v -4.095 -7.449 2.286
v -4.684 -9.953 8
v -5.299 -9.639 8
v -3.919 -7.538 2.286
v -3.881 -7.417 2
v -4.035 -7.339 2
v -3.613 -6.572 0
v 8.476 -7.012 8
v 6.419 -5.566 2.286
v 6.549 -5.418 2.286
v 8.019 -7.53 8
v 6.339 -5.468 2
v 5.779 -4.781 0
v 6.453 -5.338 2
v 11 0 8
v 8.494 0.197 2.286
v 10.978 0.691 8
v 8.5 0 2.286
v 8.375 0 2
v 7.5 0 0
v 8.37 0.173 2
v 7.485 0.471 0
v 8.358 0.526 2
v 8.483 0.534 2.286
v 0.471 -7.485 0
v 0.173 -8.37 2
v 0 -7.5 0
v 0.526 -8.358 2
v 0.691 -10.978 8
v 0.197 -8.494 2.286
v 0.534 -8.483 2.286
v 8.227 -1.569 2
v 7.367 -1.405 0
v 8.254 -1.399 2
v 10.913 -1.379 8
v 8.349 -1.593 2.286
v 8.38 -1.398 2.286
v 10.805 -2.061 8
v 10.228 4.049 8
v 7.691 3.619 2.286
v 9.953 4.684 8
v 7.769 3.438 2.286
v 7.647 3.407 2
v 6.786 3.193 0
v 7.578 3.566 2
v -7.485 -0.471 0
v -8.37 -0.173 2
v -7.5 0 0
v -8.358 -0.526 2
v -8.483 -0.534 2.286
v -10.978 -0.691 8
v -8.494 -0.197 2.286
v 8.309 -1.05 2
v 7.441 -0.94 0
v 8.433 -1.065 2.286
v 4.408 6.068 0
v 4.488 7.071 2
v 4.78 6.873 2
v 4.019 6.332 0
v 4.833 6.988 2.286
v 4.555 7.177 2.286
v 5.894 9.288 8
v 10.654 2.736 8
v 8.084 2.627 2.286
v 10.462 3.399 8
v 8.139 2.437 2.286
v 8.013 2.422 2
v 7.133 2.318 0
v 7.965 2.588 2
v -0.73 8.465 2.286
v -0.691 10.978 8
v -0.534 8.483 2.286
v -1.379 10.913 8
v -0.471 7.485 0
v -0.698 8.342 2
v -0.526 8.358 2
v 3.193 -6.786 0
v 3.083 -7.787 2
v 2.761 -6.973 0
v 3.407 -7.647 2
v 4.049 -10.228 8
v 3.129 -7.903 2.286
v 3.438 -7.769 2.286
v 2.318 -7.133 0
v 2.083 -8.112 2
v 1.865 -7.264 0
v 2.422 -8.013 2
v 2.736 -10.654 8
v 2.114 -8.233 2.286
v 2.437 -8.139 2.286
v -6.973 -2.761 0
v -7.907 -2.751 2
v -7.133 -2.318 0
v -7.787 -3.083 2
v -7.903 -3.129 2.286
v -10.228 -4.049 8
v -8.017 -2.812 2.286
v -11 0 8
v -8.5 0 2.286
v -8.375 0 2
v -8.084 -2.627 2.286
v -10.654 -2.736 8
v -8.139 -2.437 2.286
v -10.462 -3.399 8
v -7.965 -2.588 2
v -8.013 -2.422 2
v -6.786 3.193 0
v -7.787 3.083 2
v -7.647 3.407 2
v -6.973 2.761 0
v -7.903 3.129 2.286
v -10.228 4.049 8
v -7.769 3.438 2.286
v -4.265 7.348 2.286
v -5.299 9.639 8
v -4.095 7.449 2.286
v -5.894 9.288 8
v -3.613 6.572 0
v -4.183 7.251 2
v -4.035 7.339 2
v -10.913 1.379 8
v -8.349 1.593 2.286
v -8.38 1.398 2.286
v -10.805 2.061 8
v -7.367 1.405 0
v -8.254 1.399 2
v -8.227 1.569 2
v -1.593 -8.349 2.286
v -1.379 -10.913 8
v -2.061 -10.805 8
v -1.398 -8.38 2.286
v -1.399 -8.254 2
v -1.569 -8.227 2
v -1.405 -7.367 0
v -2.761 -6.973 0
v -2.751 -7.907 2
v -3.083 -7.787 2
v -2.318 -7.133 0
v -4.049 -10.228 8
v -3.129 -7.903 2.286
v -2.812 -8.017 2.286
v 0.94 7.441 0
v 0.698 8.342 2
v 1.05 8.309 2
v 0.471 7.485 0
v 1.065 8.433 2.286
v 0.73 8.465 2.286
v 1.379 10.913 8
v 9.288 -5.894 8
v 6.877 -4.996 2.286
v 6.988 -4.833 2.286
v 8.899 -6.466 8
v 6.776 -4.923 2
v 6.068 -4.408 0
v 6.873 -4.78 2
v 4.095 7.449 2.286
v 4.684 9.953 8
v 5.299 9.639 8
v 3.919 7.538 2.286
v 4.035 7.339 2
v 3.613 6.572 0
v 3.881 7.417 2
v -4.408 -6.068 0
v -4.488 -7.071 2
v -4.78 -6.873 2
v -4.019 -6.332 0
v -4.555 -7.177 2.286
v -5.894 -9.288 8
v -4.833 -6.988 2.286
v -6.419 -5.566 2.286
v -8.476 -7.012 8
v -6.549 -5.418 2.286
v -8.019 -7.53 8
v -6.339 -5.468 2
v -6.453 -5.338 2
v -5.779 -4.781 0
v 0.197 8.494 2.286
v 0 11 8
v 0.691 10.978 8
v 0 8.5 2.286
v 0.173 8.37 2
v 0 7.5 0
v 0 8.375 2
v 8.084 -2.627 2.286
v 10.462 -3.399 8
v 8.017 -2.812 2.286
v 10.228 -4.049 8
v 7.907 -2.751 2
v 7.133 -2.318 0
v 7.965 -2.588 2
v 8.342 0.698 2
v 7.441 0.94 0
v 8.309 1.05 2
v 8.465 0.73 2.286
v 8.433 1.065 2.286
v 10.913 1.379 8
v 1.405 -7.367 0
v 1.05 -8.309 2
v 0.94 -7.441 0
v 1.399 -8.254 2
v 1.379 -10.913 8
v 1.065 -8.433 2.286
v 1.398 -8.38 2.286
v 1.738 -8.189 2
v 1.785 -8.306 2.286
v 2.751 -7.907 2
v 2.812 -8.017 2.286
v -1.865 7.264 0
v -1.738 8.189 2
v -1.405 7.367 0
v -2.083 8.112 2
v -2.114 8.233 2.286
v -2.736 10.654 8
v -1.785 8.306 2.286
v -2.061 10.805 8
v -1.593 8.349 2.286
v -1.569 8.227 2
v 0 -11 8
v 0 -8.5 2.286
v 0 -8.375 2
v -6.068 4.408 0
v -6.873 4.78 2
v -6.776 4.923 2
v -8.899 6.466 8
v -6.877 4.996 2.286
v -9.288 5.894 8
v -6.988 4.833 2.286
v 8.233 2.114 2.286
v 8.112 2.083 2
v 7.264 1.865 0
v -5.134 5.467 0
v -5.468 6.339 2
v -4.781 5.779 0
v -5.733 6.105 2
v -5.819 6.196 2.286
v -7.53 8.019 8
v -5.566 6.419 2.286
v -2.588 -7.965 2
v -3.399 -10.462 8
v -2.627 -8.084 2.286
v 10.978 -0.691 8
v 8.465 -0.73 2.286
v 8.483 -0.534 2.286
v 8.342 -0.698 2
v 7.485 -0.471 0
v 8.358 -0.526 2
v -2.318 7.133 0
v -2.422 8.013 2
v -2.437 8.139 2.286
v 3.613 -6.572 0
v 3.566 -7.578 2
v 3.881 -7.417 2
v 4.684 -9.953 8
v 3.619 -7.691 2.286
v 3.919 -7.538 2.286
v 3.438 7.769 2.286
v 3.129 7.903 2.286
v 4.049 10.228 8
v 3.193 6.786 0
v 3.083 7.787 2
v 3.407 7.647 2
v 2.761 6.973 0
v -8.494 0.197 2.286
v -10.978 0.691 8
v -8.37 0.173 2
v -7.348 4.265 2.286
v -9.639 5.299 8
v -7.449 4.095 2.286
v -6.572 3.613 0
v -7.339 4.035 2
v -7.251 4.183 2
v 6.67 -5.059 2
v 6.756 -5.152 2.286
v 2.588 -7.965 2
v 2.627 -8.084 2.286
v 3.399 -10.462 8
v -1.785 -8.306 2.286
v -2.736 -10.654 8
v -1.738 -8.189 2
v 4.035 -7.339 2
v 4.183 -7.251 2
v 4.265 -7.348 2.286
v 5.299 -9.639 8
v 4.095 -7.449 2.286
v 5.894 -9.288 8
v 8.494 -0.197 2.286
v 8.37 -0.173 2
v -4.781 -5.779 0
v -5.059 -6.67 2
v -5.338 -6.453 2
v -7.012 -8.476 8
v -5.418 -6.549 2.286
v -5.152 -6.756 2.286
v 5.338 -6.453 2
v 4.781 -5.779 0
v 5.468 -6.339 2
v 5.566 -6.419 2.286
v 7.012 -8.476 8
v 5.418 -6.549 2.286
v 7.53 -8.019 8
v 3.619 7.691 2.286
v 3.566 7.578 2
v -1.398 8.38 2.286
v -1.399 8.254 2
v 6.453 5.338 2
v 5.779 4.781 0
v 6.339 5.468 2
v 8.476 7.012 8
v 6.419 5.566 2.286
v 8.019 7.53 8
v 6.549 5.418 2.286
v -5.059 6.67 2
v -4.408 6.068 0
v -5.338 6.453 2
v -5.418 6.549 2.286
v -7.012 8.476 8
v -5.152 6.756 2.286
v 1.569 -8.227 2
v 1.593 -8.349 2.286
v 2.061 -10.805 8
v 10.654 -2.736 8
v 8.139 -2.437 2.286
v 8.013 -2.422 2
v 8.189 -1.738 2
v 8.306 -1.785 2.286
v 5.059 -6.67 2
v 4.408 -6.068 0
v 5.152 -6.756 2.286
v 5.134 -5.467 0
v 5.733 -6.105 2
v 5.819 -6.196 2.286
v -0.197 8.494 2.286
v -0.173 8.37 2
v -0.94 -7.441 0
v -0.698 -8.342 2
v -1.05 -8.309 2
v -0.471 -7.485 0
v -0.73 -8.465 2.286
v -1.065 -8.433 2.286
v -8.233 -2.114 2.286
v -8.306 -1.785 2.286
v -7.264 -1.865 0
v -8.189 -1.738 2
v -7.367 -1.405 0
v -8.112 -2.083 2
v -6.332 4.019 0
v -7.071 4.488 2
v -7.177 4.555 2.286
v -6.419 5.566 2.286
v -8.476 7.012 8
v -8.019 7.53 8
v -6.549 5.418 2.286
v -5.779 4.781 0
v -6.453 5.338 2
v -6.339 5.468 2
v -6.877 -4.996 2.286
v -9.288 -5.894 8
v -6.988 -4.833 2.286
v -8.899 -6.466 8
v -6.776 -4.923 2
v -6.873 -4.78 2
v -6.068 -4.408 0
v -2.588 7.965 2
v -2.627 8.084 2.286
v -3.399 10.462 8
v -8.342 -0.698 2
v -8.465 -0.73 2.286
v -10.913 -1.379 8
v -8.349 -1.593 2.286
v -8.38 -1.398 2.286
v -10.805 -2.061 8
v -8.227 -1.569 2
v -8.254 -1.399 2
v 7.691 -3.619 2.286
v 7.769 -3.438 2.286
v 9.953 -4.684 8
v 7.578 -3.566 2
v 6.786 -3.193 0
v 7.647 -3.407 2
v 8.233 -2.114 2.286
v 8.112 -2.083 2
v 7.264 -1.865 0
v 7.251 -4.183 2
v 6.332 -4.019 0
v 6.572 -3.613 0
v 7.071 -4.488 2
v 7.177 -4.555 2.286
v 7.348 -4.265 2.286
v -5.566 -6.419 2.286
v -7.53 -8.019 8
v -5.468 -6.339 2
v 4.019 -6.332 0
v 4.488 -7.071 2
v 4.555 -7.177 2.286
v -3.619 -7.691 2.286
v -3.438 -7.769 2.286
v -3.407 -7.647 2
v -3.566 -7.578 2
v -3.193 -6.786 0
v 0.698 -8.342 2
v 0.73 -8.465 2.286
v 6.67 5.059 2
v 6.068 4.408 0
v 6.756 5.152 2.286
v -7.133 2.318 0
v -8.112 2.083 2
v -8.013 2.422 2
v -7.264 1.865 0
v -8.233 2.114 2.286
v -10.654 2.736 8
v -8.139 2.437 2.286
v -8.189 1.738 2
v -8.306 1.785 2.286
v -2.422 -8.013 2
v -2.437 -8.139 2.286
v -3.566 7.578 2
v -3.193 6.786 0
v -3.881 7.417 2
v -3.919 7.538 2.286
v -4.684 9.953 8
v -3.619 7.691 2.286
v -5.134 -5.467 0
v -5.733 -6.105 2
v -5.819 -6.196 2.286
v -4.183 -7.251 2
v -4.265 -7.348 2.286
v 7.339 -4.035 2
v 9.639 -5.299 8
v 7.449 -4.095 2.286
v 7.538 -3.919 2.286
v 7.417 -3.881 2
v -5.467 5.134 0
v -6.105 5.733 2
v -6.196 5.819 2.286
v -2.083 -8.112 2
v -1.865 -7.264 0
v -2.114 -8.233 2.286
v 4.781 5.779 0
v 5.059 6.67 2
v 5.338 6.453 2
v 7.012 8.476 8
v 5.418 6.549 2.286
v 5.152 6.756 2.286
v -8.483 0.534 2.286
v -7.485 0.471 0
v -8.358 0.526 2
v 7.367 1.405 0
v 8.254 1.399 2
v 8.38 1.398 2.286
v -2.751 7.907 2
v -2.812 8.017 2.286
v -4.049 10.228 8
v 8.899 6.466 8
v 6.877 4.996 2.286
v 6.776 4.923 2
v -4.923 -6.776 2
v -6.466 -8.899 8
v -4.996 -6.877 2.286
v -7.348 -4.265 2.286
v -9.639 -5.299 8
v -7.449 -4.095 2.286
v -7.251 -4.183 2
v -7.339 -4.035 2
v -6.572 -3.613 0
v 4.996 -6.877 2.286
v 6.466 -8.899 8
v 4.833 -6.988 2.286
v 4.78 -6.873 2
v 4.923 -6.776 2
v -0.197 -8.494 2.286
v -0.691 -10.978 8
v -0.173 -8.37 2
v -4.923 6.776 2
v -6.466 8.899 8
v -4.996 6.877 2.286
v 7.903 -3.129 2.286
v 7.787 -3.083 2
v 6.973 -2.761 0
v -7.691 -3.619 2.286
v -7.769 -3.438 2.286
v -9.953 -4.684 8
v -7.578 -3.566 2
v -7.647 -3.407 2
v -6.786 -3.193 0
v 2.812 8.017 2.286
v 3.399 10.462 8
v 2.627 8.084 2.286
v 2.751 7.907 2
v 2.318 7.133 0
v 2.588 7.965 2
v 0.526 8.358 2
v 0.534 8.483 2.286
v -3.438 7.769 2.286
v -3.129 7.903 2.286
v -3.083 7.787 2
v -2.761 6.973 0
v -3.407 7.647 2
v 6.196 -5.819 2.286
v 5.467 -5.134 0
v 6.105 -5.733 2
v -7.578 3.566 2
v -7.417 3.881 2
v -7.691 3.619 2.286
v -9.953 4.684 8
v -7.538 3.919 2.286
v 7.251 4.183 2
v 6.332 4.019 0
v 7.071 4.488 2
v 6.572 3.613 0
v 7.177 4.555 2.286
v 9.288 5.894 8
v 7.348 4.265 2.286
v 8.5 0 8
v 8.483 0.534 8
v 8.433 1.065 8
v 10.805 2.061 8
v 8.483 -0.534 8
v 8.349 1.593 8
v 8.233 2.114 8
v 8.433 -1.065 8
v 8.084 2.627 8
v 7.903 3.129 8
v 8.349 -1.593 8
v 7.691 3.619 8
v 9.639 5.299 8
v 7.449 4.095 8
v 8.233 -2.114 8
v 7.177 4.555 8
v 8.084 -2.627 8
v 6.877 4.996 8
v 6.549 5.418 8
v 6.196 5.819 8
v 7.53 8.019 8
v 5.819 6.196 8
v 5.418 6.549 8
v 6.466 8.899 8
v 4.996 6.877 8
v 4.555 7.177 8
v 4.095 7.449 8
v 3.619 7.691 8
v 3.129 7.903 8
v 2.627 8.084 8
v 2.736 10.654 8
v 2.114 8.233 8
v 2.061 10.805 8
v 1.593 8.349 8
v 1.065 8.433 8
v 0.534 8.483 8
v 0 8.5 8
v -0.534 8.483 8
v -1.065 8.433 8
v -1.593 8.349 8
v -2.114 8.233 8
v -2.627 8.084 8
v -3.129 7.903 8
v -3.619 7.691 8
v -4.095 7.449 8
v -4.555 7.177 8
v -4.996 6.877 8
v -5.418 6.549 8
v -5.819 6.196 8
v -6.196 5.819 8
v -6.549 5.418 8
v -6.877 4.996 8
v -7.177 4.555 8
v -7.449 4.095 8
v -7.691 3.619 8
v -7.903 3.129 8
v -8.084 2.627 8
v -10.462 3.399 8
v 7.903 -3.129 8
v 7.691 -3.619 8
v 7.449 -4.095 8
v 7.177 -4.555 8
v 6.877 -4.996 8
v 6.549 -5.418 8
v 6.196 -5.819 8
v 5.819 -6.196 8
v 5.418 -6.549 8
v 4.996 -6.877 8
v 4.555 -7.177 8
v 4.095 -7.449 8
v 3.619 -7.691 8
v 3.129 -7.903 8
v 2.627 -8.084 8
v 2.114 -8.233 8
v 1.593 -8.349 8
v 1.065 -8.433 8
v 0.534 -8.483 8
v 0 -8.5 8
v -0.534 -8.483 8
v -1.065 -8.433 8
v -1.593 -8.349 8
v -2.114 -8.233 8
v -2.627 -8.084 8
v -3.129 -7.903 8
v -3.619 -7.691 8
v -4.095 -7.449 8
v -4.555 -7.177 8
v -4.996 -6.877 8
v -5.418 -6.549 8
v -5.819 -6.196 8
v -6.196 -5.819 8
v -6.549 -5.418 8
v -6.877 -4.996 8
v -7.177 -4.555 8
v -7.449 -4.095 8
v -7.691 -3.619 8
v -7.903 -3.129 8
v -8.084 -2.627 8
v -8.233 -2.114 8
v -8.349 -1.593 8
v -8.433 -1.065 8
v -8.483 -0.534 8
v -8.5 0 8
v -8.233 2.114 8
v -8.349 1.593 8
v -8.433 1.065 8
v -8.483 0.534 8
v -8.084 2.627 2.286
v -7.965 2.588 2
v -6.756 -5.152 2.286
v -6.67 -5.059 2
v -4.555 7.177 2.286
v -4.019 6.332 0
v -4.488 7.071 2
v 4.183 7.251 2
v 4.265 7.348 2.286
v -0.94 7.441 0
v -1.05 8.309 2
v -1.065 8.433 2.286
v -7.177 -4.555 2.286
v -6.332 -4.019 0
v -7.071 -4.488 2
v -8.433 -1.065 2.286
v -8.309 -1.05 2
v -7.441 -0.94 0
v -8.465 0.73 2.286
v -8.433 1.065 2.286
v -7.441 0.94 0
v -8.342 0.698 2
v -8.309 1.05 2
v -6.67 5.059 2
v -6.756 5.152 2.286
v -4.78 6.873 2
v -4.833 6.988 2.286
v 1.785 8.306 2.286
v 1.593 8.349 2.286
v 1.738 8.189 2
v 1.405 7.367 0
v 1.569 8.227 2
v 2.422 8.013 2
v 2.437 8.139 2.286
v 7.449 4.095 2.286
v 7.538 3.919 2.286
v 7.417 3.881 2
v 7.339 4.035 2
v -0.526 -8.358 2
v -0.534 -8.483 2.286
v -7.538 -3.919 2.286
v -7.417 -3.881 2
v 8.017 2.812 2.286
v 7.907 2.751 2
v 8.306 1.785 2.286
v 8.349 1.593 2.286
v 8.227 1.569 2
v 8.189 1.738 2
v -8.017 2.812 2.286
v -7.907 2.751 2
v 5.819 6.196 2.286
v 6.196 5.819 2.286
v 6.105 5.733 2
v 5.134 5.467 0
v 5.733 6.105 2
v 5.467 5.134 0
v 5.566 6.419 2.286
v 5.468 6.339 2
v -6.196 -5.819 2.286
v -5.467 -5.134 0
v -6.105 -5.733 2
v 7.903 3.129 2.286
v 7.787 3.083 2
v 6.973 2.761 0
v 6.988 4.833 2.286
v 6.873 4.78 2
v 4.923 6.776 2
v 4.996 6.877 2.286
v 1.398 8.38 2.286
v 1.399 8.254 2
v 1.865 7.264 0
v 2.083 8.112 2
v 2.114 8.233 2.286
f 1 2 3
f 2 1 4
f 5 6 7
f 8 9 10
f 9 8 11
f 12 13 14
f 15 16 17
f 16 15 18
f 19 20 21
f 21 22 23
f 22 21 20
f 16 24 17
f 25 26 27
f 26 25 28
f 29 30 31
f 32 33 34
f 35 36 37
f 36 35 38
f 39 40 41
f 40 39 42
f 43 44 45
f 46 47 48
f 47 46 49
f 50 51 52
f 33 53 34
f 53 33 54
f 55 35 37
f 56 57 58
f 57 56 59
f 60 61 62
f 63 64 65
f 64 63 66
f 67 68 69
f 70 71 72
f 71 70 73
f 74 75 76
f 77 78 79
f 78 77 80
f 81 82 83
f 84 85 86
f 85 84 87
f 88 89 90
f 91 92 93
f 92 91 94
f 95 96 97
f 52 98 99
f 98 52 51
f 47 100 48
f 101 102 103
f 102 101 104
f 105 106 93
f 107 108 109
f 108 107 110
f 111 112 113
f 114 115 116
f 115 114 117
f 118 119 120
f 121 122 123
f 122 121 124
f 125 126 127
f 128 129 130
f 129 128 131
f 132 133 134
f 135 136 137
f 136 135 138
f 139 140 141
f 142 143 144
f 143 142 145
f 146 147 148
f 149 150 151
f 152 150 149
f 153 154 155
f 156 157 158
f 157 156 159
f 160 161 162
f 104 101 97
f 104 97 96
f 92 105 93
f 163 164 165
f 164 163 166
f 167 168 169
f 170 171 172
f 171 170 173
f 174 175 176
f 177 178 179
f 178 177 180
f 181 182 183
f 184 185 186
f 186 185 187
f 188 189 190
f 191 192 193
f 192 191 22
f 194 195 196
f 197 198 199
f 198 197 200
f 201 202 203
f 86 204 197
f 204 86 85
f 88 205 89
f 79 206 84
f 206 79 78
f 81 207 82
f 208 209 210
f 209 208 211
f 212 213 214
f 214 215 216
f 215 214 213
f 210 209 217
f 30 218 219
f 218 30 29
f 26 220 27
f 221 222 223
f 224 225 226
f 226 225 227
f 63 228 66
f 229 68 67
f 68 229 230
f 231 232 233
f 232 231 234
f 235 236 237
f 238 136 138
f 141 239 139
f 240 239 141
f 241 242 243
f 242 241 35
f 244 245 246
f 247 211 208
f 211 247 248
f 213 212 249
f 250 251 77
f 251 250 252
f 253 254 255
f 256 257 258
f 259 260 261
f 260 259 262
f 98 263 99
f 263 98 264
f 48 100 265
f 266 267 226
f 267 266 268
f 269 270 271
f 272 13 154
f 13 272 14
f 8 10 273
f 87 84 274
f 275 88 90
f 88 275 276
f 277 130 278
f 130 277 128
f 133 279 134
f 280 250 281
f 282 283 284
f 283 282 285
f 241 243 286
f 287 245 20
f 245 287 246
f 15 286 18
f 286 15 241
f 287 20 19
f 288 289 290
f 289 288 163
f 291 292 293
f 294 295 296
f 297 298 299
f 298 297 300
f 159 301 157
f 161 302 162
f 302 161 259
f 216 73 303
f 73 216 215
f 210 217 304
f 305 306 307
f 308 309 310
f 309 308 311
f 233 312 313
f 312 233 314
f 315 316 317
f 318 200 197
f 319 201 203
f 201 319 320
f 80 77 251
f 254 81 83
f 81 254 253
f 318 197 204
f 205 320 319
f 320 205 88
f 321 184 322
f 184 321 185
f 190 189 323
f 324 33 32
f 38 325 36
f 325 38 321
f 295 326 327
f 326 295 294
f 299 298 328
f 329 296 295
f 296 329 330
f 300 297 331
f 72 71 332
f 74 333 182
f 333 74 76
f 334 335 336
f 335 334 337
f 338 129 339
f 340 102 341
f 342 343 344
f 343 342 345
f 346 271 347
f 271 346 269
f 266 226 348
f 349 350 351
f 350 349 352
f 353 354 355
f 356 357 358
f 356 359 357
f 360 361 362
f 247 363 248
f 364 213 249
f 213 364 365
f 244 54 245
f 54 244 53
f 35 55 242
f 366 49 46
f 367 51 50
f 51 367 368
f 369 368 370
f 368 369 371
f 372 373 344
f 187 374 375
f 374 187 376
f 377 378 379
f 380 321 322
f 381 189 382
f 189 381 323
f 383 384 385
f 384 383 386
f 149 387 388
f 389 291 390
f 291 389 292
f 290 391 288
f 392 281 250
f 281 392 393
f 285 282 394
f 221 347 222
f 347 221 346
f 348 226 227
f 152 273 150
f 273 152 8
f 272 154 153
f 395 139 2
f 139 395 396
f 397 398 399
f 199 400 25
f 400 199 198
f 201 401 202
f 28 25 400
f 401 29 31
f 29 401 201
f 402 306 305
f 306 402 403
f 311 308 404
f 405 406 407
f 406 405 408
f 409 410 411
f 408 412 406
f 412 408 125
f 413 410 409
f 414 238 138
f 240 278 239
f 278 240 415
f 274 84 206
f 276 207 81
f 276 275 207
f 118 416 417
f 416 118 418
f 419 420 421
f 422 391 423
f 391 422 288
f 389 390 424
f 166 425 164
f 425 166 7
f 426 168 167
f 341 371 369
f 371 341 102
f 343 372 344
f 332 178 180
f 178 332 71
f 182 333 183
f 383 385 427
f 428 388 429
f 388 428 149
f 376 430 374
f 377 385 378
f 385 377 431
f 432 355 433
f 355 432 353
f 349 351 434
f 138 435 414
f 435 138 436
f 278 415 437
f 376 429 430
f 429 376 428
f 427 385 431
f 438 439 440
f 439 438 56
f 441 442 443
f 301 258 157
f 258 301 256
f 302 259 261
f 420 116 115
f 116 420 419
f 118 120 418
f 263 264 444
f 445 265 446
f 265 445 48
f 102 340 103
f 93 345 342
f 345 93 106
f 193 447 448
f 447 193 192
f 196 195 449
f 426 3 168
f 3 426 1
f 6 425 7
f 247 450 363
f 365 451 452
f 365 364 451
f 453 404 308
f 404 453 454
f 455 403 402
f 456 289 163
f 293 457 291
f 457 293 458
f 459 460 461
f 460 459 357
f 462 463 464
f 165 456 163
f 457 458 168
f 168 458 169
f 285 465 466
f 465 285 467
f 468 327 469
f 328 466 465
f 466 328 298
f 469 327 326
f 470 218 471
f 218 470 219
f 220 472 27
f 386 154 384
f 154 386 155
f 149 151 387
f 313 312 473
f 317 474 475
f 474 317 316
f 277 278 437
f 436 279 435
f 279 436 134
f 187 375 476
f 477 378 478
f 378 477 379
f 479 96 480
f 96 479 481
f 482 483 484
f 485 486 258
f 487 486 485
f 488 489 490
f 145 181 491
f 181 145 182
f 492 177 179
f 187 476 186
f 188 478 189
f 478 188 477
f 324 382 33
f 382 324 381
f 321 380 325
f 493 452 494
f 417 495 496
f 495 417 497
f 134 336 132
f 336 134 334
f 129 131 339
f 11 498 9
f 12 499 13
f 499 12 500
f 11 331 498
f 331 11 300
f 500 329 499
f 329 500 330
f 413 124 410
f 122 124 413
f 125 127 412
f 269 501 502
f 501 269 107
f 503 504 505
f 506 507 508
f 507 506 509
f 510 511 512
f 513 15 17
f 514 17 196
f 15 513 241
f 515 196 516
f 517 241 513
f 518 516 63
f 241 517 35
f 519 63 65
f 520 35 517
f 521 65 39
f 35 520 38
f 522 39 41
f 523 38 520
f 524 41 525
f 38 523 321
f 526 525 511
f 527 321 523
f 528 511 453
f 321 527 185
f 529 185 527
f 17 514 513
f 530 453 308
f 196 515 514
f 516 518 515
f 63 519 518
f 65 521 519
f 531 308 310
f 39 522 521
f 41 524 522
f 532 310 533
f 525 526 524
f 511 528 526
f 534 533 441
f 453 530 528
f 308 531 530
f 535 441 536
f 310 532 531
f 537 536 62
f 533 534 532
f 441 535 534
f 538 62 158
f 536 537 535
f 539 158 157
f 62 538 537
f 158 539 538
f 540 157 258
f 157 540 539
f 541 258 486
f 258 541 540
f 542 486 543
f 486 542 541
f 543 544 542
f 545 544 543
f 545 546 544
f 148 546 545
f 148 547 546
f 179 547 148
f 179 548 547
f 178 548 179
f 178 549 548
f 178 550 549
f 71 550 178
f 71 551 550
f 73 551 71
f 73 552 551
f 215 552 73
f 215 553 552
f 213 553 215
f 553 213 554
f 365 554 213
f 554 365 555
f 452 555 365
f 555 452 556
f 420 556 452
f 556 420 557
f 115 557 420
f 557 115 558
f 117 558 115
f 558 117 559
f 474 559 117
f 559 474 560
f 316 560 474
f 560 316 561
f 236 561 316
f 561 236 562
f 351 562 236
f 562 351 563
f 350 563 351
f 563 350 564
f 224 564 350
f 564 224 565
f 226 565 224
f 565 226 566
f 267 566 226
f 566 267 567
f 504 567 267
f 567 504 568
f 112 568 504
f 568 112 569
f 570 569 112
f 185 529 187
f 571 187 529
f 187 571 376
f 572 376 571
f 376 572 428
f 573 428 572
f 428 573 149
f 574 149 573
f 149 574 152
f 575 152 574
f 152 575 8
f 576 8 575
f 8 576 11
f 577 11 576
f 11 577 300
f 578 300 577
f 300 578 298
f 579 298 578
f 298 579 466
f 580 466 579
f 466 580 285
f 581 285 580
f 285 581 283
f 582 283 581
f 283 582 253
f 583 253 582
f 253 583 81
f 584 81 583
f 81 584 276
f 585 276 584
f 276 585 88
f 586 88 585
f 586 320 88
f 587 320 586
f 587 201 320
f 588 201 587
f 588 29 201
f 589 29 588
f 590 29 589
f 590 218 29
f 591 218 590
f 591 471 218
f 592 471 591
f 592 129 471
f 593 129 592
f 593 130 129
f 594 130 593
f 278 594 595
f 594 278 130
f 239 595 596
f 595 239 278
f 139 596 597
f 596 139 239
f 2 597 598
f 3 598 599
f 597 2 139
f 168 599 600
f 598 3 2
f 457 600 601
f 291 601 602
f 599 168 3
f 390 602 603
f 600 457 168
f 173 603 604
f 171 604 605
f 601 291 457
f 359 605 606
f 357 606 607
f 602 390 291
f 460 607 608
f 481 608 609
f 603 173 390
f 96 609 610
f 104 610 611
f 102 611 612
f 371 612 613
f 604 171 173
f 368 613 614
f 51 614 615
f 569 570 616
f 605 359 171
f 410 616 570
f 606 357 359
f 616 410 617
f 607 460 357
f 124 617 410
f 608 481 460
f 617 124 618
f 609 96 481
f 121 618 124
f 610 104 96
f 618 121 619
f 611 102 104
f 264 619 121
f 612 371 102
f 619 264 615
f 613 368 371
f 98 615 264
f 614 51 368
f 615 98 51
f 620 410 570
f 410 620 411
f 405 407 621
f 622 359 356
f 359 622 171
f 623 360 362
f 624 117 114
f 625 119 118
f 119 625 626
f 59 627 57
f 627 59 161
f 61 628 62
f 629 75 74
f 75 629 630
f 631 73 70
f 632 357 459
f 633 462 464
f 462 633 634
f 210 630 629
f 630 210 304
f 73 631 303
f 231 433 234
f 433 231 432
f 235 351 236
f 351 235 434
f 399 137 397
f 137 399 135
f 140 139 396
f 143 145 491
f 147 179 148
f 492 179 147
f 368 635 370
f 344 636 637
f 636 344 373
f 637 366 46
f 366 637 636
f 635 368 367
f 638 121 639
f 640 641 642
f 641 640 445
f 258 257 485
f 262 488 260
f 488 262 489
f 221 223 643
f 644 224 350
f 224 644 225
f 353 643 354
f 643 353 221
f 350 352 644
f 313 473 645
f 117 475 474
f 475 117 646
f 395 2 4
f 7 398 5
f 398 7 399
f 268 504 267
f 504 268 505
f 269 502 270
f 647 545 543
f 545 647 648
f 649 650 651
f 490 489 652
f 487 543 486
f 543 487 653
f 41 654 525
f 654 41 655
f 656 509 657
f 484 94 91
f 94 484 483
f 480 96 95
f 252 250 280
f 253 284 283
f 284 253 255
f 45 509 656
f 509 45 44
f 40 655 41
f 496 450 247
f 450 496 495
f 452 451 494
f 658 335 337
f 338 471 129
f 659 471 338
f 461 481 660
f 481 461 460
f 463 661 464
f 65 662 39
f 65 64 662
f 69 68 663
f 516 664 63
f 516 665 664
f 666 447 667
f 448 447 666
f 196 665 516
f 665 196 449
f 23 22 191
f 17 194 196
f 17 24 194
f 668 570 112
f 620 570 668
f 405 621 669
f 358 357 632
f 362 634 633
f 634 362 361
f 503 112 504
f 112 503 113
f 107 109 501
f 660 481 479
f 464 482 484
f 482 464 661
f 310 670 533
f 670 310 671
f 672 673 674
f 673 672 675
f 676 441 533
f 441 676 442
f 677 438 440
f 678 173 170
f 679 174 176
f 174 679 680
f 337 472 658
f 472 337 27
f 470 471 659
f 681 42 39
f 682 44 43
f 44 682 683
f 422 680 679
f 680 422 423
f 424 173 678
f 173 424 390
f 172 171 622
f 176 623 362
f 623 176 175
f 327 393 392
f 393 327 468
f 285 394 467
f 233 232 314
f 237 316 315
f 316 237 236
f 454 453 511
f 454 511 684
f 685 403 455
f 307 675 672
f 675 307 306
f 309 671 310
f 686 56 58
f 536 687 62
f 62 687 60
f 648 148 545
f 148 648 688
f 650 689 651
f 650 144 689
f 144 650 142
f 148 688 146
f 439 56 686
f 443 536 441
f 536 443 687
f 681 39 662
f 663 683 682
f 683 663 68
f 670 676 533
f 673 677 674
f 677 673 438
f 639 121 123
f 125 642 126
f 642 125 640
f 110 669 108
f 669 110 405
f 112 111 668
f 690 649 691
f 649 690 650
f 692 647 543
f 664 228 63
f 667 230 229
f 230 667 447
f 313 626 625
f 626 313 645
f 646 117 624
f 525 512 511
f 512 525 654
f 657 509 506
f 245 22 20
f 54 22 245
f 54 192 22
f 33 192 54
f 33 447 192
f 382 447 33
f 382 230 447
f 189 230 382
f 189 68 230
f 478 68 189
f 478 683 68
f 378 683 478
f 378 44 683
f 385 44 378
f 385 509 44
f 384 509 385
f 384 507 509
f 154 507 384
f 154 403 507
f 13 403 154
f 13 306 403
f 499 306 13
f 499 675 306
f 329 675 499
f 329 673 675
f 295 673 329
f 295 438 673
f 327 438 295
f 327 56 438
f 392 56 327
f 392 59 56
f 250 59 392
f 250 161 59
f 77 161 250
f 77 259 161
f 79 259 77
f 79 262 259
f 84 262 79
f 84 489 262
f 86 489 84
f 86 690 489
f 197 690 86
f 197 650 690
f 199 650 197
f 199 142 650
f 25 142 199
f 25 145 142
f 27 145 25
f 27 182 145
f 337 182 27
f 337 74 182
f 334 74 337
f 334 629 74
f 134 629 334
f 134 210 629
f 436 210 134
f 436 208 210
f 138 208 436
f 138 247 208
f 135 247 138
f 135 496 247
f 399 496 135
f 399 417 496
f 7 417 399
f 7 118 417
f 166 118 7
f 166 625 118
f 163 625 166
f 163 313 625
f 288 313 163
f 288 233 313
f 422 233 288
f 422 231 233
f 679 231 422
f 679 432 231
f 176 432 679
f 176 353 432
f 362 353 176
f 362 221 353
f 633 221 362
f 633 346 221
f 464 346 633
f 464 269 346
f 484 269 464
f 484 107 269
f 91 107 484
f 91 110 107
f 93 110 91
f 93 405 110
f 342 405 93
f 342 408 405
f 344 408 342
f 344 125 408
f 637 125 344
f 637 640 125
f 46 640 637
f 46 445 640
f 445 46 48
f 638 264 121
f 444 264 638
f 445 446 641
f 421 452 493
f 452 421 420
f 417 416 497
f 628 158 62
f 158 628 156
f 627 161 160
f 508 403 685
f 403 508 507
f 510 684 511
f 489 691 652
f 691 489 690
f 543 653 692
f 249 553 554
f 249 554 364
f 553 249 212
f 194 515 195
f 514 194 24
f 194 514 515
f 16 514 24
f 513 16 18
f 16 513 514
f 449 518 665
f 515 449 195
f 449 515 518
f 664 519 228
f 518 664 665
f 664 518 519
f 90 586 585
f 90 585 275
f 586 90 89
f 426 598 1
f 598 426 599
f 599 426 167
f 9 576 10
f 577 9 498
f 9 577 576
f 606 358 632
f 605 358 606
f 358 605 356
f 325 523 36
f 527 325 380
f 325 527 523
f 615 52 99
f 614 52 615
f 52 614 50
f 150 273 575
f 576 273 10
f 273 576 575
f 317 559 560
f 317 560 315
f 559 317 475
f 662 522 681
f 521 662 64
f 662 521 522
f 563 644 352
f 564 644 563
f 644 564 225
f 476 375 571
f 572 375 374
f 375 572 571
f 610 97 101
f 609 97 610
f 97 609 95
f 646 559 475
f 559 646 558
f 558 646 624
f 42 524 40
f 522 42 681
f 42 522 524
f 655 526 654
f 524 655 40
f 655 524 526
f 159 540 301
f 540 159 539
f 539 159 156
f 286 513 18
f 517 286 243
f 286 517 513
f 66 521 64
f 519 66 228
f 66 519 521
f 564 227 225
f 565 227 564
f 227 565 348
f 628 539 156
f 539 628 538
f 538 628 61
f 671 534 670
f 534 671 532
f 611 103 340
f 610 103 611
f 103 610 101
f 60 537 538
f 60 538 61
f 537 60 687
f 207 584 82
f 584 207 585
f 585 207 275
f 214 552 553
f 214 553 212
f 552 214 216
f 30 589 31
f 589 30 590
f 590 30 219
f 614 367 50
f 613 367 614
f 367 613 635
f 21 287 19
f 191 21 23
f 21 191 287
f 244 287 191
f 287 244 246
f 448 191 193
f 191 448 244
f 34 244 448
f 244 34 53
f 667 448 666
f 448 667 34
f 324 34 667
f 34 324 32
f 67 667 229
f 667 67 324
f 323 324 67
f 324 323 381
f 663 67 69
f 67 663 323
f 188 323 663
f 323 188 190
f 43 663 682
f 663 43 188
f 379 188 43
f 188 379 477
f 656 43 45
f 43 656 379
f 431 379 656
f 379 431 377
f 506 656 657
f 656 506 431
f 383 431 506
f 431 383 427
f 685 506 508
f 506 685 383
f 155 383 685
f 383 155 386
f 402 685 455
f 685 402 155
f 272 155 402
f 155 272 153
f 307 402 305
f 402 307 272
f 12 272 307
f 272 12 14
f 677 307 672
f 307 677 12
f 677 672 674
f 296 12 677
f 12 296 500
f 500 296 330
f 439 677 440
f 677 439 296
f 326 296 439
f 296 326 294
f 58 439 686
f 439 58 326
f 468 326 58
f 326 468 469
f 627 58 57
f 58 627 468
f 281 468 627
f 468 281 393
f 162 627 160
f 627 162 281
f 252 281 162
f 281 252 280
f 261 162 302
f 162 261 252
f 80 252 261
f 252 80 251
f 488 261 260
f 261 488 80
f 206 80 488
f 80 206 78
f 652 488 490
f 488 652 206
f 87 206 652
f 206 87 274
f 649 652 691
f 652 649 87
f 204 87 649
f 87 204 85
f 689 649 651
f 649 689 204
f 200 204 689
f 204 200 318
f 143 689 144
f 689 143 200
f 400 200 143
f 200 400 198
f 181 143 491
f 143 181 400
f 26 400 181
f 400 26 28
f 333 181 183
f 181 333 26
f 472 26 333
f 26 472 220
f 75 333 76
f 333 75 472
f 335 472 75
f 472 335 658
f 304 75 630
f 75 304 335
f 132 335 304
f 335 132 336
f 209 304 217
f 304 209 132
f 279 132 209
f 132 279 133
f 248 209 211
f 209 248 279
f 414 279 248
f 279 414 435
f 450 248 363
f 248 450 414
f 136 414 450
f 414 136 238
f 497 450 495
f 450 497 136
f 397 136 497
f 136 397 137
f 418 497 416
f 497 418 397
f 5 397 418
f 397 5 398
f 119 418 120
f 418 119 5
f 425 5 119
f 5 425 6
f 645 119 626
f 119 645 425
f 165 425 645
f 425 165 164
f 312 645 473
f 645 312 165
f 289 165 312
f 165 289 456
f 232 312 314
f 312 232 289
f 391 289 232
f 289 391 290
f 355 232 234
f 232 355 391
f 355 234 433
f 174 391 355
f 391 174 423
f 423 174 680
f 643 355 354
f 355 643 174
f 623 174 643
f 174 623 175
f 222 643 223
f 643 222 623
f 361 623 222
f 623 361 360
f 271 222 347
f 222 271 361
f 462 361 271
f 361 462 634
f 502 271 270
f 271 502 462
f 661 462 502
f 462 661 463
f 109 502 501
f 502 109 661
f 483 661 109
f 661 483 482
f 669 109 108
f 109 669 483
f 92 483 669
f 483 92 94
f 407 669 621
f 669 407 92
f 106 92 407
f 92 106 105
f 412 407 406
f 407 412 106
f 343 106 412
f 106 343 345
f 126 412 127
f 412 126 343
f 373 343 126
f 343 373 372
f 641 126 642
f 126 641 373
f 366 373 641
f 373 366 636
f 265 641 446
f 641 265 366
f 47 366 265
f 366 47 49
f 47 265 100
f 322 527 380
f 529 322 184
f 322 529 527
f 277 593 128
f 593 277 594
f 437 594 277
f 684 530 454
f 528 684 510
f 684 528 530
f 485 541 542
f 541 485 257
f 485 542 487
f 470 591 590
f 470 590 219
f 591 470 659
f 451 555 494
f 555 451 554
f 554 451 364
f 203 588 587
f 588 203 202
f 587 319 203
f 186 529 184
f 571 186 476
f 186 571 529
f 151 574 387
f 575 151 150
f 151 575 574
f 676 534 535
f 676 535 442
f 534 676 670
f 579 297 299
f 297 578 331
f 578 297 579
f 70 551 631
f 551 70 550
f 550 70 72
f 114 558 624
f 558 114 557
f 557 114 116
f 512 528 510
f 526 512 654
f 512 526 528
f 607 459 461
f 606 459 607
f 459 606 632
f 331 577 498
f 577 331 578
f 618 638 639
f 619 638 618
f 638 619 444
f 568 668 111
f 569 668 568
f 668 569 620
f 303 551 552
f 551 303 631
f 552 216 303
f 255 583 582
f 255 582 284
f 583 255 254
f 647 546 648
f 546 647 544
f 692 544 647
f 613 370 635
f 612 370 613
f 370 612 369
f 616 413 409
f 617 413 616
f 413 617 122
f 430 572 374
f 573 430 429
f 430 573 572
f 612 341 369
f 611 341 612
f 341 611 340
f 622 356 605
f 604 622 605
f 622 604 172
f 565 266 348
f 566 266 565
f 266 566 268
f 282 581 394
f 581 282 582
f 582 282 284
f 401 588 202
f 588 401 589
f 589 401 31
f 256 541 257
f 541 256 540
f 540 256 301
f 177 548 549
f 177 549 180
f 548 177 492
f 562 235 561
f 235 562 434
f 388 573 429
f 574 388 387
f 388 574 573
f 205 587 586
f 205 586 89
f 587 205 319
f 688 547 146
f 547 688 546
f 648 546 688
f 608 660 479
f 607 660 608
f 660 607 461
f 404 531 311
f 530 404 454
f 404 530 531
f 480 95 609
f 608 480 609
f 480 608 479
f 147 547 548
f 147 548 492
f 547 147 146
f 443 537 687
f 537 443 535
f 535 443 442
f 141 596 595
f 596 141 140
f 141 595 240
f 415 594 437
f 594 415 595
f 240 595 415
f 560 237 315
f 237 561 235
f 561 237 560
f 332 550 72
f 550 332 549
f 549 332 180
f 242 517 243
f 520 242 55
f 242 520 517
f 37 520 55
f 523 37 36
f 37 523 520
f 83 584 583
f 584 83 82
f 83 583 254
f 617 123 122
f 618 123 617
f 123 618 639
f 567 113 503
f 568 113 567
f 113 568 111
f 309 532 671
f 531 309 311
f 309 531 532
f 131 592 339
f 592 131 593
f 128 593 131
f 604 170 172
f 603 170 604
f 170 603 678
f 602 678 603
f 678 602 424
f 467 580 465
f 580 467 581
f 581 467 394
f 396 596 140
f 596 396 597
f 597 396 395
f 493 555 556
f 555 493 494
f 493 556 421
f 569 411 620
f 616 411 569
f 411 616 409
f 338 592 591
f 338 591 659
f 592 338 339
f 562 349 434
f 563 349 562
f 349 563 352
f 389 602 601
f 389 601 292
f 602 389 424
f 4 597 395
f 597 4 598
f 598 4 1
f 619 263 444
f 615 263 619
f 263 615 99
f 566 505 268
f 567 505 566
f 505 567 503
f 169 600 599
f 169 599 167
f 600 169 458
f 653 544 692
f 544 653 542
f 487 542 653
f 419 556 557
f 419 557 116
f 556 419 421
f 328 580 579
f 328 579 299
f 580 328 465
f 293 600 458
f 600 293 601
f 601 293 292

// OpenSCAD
//--------------------------------------------------------------
// Name: Подставка для цилиндрического повербанка. PwbStand.
// Version: 1.7
// Purpose: Замок.
// Author: Evgeny Klepikov
// E-mail: klek07@ya.ru
//
// Created: 25.09.2017
// Updated: 26.09.2017
// Copyright: (c) 2017 WildFox24
// Licence: GPL v3
//--------------------------------------------------------------

difference() {
    translate([0,0,0]) cylinder(h=8, d1=15, d2=22, $fn=100);
    translate([0,0,2]) cylinder(h=8, d=17, $fn=100);
}
